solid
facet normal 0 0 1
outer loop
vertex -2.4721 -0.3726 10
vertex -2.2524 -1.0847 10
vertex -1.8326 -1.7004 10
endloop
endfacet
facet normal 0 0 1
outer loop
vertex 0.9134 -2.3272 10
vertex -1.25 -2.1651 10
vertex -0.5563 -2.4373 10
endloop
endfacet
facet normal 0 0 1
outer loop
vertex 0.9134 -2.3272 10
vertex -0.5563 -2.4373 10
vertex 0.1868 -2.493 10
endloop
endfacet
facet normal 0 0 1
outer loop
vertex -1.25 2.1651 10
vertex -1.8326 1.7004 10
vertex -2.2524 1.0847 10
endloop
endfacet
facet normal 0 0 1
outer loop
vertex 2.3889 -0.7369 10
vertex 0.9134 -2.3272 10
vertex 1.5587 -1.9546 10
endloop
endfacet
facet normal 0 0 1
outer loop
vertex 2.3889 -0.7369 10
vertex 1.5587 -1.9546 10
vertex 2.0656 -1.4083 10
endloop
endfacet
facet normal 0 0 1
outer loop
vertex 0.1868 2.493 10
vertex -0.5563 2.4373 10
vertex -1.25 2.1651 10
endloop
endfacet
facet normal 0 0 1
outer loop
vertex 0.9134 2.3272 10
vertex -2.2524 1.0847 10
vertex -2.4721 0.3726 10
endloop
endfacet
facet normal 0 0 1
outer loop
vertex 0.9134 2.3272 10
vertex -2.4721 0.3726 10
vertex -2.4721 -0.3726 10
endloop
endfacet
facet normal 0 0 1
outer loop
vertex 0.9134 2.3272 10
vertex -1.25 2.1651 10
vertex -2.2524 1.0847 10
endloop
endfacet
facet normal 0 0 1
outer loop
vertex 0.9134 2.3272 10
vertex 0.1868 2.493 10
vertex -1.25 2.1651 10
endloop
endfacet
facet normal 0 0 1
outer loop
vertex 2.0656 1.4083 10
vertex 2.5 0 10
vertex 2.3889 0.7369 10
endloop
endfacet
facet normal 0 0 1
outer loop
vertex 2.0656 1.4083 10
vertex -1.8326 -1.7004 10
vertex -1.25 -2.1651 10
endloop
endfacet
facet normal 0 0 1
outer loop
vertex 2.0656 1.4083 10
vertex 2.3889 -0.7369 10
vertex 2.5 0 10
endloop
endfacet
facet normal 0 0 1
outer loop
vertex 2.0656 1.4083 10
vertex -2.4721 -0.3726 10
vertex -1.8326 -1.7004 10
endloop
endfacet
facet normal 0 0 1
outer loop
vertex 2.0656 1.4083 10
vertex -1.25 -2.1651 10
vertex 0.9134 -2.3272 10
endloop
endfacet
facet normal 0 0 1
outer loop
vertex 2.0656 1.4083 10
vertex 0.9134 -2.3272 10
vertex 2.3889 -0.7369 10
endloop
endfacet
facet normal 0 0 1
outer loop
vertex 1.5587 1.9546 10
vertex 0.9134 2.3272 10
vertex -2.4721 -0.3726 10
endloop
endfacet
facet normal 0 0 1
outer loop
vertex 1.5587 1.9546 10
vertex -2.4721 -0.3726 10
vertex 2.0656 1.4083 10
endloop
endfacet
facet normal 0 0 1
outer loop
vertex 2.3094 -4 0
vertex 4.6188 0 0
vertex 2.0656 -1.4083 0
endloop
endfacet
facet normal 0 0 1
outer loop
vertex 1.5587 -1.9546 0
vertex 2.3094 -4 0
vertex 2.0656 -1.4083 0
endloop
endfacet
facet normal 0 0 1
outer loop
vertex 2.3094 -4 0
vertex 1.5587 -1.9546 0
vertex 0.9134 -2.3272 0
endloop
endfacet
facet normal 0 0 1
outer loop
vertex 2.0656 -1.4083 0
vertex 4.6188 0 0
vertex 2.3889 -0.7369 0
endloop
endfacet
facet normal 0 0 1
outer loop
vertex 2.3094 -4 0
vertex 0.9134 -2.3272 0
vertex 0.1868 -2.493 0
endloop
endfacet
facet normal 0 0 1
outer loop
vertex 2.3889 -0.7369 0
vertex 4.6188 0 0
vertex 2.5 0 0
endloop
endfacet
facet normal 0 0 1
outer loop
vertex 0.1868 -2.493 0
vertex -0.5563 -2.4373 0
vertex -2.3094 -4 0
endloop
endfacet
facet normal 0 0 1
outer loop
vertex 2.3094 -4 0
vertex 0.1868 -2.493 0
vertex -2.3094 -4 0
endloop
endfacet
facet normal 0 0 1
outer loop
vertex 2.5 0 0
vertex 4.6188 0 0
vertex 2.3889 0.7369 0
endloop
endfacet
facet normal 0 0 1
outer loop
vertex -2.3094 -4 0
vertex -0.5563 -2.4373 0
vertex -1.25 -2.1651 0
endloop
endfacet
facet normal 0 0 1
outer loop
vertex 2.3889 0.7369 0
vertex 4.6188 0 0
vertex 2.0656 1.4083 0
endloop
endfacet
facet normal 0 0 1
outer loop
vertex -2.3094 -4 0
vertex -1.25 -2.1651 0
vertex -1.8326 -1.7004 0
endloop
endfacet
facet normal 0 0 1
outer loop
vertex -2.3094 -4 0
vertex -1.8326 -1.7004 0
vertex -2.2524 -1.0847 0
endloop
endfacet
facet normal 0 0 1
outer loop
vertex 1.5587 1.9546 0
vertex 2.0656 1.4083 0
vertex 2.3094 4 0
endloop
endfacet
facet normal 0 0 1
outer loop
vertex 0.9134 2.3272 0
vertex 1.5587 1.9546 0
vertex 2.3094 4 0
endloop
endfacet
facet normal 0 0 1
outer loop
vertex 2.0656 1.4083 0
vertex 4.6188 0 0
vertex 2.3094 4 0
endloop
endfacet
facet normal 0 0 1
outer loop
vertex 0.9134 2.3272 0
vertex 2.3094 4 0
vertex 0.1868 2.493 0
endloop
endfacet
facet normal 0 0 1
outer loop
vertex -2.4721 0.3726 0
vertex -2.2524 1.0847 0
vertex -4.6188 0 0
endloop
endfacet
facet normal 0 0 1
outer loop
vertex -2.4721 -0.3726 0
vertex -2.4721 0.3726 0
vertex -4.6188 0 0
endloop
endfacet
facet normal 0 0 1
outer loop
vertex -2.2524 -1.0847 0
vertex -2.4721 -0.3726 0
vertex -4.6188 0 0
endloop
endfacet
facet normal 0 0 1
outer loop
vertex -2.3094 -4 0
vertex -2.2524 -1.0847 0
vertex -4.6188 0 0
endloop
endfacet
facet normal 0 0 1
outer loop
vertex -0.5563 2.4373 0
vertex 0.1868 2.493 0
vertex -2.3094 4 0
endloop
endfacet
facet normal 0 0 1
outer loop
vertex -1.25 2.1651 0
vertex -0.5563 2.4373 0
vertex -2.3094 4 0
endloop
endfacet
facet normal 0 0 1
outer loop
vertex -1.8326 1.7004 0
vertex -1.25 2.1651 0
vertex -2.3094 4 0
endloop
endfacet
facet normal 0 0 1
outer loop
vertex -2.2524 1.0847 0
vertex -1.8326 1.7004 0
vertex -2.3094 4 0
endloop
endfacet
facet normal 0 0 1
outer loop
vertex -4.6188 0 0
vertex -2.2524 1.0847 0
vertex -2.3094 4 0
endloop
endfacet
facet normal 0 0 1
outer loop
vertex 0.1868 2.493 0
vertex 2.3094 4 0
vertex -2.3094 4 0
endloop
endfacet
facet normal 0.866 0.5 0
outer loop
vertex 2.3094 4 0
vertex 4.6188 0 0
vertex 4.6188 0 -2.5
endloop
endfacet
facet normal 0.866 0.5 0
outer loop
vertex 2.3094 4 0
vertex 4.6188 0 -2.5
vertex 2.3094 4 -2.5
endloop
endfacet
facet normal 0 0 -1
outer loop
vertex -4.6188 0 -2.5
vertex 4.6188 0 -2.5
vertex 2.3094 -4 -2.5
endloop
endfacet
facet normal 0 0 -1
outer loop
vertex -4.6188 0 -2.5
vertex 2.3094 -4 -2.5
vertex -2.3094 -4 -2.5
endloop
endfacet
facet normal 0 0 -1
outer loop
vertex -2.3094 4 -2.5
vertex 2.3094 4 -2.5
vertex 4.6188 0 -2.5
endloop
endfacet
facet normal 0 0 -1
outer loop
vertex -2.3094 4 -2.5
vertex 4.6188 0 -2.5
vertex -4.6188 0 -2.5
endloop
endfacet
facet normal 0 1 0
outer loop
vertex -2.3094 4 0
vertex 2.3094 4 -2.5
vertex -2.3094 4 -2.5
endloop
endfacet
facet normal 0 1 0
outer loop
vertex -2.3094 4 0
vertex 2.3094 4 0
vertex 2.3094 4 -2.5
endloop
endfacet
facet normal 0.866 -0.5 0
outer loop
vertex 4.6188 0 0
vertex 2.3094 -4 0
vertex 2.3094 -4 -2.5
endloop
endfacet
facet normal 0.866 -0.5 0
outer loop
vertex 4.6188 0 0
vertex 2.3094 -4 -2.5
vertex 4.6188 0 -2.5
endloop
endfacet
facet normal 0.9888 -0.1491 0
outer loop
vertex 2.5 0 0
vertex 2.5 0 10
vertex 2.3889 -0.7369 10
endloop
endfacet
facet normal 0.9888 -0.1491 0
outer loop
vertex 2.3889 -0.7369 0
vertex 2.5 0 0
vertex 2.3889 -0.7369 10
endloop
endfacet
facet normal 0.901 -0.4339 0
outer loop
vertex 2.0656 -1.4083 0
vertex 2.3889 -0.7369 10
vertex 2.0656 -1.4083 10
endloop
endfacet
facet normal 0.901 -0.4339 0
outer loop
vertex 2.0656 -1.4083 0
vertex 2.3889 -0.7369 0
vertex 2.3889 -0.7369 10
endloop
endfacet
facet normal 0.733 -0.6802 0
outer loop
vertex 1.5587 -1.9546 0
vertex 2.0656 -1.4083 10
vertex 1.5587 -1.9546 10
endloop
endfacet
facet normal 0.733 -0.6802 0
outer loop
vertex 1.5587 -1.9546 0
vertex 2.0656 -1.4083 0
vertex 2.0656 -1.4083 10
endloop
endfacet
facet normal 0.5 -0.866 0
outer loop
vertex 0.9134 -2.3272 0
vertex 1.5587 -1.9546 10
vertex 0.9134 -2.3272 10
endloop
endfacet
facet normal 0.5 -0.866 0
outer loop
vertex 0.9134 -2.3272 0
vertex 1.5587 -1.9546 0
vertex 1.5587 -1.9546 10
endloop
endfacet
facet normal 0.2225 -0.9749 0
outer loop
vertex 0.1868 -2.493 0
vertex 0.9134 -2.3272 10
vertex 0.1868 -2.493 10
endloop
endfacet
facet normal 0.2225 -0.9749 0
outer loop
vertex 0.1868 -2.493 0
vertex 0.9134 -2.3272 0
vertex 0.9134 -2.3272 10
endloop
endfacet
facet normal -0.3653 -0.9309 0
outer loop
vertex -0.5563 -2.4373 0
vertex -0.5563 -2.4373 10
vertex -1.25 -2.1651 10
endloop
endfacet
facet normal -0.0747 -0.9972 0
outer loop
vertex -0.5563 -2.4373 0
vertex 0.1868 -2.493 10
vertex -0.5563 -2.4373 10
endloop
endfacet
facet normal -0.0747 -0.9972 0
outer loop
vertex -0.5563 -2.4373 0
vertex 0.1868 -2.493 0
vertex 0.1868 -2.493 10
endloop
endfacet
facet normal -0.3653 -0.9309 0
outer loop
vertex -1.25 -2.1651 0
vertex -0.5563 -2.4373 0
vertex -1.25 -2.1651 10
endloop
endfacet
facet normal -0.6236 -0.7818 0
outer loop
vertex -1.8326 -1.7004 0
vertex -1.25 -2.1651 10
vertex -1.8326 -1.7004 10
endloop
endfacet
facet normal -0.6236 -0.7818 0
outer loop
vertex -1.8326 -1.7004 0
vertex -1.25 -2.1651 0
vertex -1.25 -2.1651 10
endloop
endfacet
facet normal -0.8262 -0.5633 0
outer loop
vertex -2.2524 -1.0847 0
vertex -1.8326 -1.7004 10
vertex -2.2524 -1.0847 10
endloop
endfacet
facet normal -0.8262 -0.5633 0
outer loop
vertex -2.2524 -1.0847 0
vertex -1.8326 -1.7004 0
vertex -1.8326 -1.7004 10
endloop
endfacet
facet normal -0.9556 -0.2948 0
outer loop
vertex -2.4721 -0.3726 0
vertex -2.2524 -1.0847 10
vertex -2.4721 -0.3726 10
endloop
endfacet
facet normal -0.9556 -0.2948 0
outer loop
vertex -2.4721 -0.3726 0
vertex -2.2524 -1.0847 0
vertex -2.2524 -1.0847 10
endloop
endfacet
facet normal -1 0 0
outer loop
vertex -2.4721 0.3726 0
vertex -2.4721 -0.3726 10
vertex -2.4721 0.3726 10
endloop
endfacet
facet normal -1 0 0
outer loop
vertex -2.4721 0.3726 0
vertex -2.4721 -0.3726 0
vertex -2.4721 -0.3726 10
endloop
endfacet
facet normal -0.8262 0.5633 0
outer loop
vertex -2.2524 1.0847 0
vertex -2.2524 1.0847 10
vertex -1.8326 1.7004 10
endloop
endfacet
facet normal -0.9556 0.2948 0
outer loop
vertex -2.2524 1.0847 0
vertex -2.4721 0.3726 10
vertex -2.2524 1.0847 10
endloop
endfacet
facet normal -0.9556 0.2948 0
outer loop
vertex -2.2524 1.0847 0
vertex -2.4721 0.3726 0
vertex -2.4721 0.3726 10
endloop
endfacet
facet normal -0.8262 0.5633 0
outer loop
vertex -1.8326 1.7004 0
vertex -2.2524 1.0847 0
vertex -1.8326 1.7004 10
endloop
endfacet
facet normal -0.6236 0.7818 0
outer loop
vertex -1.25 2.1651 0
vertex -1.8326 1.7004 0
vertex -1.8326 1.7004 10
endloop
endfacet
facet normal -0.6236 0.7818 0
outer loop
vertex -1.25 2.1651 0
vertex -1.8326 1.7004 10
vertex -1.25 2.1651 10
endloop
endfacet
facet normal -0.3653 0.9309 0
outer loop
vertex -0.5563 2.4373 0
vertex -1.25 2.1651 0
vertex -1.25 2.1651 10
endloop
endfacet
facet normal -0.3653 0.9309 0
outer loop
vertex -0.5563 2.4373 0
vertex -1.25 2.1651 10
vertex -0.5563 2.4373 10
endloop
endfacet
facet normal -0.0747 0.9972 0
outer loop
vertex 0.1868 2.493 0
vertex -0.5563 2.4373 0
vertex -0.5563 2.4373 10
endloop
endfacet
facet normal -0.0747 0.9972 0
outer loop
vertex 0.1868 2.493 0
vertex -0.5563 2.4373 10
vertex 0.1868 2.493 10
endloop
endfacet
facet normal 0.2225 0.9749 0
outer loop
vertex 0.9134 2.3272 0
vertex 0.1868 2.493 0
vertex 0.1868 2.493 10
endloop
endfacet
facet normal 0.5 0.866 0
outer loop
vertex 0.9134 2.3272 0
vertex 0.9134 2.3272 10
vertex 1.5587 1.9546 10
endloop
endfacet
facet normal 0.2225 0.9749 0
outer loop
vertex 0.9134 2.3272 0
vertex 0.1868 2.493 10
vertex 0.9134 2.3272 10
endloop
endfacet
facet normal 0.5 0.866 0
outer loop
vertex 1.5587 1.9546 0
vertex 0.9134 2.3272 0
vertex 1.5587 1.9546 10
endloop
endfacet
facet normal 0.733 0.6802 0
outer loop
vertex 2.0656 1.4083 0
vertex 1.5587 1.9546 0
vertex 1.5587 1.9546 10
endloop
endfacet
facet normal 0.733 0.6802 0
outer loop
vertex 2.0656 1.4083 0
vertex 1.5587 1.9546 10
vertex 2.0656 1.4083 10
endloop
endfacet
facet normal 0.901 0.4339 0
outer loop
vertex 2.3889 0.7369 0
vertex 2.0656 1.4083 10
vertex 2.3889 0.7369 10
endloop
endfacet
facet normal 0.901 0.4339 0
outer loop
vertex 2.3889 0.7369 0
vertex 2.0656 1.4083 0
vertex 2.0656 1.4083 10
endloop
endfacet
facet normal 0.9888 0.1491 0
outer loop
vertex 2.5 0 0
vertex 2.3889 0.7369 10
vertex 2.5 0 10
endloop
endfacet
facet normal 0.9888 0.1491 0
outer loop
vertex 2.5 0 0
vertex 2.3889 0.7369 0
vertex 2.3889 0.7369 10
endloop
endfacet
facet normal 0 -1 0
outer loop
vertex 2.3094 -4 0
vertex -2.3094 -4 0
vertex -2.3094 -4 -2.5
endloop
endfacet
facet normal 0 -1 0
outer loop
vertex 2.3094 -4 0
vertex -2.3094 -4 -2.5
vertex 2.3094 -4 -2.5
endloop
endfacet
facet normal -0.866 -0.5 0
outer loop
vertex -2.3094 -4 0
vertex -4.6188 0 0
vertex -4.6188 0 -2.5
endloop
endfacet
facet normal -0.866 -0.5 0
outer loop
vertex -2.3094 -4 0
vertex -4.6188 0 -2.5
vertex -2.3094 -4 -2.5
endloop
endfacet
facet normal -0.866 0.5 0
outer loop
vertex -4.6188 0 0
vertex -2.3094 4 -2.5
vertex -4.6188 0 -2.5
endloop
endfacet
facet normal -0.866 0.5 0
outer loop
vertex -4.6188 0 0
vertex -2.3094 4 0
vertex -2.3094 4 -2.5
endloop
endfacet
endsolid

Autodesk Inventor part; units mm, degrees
ref_plane "YZ Plane" through (0, 0, 0) normal (1, 0, 0) x (0, 1, 0)
ref_plane "XZ Plane" through (0, 0, 0) normal (0, 1, 0) x (-1, 0, 0)
ref_plane "XY Plane" through (0, 0, 0) normal (0, 0, 1) x (1, 0, 0)
sketch "スケッチ1" plane through (0, 0, 0) normal (0, 0, 1) x (1, 0, 0)
  circle A0 centre (0, 0) radius 2.5
  dimension "d0" = 5
extrude "押し出し1" add sketch "スケッチ1" along normal blind 10
sketch "スケッチ2" plane through (0, 0, 0) normal (0, 0, -1) x (-1, 0, 0)
  line L0 (4.6188, 0) -> (2.3094, -4)
  line L1 (2.3094, -4) -> (-2.3094, -4)
  line L2 (-2.3094, -4) -> (-4.6188, 0)
  line L3 (-4.6188, 0) -> (-2.3094, 4)
  line L4 (-2.3094, 4) -> (2.3094, 4)
  line L5 (2.3094, 4) -> (4.6188, 0)
  point P0 (0, 0)
  point P1 (0, 0)
  dimension "d3" = 8
extrude "押し出し2" add sketch "スケッチ2" along normal blind 2.5
thread "ねじ1" size "M5x0.8" class "6g" standard "ANSI Metric M Profile" full length
properties part number "ネジ六角ボルトm5,10" material "鋼、高強度、低合金"
